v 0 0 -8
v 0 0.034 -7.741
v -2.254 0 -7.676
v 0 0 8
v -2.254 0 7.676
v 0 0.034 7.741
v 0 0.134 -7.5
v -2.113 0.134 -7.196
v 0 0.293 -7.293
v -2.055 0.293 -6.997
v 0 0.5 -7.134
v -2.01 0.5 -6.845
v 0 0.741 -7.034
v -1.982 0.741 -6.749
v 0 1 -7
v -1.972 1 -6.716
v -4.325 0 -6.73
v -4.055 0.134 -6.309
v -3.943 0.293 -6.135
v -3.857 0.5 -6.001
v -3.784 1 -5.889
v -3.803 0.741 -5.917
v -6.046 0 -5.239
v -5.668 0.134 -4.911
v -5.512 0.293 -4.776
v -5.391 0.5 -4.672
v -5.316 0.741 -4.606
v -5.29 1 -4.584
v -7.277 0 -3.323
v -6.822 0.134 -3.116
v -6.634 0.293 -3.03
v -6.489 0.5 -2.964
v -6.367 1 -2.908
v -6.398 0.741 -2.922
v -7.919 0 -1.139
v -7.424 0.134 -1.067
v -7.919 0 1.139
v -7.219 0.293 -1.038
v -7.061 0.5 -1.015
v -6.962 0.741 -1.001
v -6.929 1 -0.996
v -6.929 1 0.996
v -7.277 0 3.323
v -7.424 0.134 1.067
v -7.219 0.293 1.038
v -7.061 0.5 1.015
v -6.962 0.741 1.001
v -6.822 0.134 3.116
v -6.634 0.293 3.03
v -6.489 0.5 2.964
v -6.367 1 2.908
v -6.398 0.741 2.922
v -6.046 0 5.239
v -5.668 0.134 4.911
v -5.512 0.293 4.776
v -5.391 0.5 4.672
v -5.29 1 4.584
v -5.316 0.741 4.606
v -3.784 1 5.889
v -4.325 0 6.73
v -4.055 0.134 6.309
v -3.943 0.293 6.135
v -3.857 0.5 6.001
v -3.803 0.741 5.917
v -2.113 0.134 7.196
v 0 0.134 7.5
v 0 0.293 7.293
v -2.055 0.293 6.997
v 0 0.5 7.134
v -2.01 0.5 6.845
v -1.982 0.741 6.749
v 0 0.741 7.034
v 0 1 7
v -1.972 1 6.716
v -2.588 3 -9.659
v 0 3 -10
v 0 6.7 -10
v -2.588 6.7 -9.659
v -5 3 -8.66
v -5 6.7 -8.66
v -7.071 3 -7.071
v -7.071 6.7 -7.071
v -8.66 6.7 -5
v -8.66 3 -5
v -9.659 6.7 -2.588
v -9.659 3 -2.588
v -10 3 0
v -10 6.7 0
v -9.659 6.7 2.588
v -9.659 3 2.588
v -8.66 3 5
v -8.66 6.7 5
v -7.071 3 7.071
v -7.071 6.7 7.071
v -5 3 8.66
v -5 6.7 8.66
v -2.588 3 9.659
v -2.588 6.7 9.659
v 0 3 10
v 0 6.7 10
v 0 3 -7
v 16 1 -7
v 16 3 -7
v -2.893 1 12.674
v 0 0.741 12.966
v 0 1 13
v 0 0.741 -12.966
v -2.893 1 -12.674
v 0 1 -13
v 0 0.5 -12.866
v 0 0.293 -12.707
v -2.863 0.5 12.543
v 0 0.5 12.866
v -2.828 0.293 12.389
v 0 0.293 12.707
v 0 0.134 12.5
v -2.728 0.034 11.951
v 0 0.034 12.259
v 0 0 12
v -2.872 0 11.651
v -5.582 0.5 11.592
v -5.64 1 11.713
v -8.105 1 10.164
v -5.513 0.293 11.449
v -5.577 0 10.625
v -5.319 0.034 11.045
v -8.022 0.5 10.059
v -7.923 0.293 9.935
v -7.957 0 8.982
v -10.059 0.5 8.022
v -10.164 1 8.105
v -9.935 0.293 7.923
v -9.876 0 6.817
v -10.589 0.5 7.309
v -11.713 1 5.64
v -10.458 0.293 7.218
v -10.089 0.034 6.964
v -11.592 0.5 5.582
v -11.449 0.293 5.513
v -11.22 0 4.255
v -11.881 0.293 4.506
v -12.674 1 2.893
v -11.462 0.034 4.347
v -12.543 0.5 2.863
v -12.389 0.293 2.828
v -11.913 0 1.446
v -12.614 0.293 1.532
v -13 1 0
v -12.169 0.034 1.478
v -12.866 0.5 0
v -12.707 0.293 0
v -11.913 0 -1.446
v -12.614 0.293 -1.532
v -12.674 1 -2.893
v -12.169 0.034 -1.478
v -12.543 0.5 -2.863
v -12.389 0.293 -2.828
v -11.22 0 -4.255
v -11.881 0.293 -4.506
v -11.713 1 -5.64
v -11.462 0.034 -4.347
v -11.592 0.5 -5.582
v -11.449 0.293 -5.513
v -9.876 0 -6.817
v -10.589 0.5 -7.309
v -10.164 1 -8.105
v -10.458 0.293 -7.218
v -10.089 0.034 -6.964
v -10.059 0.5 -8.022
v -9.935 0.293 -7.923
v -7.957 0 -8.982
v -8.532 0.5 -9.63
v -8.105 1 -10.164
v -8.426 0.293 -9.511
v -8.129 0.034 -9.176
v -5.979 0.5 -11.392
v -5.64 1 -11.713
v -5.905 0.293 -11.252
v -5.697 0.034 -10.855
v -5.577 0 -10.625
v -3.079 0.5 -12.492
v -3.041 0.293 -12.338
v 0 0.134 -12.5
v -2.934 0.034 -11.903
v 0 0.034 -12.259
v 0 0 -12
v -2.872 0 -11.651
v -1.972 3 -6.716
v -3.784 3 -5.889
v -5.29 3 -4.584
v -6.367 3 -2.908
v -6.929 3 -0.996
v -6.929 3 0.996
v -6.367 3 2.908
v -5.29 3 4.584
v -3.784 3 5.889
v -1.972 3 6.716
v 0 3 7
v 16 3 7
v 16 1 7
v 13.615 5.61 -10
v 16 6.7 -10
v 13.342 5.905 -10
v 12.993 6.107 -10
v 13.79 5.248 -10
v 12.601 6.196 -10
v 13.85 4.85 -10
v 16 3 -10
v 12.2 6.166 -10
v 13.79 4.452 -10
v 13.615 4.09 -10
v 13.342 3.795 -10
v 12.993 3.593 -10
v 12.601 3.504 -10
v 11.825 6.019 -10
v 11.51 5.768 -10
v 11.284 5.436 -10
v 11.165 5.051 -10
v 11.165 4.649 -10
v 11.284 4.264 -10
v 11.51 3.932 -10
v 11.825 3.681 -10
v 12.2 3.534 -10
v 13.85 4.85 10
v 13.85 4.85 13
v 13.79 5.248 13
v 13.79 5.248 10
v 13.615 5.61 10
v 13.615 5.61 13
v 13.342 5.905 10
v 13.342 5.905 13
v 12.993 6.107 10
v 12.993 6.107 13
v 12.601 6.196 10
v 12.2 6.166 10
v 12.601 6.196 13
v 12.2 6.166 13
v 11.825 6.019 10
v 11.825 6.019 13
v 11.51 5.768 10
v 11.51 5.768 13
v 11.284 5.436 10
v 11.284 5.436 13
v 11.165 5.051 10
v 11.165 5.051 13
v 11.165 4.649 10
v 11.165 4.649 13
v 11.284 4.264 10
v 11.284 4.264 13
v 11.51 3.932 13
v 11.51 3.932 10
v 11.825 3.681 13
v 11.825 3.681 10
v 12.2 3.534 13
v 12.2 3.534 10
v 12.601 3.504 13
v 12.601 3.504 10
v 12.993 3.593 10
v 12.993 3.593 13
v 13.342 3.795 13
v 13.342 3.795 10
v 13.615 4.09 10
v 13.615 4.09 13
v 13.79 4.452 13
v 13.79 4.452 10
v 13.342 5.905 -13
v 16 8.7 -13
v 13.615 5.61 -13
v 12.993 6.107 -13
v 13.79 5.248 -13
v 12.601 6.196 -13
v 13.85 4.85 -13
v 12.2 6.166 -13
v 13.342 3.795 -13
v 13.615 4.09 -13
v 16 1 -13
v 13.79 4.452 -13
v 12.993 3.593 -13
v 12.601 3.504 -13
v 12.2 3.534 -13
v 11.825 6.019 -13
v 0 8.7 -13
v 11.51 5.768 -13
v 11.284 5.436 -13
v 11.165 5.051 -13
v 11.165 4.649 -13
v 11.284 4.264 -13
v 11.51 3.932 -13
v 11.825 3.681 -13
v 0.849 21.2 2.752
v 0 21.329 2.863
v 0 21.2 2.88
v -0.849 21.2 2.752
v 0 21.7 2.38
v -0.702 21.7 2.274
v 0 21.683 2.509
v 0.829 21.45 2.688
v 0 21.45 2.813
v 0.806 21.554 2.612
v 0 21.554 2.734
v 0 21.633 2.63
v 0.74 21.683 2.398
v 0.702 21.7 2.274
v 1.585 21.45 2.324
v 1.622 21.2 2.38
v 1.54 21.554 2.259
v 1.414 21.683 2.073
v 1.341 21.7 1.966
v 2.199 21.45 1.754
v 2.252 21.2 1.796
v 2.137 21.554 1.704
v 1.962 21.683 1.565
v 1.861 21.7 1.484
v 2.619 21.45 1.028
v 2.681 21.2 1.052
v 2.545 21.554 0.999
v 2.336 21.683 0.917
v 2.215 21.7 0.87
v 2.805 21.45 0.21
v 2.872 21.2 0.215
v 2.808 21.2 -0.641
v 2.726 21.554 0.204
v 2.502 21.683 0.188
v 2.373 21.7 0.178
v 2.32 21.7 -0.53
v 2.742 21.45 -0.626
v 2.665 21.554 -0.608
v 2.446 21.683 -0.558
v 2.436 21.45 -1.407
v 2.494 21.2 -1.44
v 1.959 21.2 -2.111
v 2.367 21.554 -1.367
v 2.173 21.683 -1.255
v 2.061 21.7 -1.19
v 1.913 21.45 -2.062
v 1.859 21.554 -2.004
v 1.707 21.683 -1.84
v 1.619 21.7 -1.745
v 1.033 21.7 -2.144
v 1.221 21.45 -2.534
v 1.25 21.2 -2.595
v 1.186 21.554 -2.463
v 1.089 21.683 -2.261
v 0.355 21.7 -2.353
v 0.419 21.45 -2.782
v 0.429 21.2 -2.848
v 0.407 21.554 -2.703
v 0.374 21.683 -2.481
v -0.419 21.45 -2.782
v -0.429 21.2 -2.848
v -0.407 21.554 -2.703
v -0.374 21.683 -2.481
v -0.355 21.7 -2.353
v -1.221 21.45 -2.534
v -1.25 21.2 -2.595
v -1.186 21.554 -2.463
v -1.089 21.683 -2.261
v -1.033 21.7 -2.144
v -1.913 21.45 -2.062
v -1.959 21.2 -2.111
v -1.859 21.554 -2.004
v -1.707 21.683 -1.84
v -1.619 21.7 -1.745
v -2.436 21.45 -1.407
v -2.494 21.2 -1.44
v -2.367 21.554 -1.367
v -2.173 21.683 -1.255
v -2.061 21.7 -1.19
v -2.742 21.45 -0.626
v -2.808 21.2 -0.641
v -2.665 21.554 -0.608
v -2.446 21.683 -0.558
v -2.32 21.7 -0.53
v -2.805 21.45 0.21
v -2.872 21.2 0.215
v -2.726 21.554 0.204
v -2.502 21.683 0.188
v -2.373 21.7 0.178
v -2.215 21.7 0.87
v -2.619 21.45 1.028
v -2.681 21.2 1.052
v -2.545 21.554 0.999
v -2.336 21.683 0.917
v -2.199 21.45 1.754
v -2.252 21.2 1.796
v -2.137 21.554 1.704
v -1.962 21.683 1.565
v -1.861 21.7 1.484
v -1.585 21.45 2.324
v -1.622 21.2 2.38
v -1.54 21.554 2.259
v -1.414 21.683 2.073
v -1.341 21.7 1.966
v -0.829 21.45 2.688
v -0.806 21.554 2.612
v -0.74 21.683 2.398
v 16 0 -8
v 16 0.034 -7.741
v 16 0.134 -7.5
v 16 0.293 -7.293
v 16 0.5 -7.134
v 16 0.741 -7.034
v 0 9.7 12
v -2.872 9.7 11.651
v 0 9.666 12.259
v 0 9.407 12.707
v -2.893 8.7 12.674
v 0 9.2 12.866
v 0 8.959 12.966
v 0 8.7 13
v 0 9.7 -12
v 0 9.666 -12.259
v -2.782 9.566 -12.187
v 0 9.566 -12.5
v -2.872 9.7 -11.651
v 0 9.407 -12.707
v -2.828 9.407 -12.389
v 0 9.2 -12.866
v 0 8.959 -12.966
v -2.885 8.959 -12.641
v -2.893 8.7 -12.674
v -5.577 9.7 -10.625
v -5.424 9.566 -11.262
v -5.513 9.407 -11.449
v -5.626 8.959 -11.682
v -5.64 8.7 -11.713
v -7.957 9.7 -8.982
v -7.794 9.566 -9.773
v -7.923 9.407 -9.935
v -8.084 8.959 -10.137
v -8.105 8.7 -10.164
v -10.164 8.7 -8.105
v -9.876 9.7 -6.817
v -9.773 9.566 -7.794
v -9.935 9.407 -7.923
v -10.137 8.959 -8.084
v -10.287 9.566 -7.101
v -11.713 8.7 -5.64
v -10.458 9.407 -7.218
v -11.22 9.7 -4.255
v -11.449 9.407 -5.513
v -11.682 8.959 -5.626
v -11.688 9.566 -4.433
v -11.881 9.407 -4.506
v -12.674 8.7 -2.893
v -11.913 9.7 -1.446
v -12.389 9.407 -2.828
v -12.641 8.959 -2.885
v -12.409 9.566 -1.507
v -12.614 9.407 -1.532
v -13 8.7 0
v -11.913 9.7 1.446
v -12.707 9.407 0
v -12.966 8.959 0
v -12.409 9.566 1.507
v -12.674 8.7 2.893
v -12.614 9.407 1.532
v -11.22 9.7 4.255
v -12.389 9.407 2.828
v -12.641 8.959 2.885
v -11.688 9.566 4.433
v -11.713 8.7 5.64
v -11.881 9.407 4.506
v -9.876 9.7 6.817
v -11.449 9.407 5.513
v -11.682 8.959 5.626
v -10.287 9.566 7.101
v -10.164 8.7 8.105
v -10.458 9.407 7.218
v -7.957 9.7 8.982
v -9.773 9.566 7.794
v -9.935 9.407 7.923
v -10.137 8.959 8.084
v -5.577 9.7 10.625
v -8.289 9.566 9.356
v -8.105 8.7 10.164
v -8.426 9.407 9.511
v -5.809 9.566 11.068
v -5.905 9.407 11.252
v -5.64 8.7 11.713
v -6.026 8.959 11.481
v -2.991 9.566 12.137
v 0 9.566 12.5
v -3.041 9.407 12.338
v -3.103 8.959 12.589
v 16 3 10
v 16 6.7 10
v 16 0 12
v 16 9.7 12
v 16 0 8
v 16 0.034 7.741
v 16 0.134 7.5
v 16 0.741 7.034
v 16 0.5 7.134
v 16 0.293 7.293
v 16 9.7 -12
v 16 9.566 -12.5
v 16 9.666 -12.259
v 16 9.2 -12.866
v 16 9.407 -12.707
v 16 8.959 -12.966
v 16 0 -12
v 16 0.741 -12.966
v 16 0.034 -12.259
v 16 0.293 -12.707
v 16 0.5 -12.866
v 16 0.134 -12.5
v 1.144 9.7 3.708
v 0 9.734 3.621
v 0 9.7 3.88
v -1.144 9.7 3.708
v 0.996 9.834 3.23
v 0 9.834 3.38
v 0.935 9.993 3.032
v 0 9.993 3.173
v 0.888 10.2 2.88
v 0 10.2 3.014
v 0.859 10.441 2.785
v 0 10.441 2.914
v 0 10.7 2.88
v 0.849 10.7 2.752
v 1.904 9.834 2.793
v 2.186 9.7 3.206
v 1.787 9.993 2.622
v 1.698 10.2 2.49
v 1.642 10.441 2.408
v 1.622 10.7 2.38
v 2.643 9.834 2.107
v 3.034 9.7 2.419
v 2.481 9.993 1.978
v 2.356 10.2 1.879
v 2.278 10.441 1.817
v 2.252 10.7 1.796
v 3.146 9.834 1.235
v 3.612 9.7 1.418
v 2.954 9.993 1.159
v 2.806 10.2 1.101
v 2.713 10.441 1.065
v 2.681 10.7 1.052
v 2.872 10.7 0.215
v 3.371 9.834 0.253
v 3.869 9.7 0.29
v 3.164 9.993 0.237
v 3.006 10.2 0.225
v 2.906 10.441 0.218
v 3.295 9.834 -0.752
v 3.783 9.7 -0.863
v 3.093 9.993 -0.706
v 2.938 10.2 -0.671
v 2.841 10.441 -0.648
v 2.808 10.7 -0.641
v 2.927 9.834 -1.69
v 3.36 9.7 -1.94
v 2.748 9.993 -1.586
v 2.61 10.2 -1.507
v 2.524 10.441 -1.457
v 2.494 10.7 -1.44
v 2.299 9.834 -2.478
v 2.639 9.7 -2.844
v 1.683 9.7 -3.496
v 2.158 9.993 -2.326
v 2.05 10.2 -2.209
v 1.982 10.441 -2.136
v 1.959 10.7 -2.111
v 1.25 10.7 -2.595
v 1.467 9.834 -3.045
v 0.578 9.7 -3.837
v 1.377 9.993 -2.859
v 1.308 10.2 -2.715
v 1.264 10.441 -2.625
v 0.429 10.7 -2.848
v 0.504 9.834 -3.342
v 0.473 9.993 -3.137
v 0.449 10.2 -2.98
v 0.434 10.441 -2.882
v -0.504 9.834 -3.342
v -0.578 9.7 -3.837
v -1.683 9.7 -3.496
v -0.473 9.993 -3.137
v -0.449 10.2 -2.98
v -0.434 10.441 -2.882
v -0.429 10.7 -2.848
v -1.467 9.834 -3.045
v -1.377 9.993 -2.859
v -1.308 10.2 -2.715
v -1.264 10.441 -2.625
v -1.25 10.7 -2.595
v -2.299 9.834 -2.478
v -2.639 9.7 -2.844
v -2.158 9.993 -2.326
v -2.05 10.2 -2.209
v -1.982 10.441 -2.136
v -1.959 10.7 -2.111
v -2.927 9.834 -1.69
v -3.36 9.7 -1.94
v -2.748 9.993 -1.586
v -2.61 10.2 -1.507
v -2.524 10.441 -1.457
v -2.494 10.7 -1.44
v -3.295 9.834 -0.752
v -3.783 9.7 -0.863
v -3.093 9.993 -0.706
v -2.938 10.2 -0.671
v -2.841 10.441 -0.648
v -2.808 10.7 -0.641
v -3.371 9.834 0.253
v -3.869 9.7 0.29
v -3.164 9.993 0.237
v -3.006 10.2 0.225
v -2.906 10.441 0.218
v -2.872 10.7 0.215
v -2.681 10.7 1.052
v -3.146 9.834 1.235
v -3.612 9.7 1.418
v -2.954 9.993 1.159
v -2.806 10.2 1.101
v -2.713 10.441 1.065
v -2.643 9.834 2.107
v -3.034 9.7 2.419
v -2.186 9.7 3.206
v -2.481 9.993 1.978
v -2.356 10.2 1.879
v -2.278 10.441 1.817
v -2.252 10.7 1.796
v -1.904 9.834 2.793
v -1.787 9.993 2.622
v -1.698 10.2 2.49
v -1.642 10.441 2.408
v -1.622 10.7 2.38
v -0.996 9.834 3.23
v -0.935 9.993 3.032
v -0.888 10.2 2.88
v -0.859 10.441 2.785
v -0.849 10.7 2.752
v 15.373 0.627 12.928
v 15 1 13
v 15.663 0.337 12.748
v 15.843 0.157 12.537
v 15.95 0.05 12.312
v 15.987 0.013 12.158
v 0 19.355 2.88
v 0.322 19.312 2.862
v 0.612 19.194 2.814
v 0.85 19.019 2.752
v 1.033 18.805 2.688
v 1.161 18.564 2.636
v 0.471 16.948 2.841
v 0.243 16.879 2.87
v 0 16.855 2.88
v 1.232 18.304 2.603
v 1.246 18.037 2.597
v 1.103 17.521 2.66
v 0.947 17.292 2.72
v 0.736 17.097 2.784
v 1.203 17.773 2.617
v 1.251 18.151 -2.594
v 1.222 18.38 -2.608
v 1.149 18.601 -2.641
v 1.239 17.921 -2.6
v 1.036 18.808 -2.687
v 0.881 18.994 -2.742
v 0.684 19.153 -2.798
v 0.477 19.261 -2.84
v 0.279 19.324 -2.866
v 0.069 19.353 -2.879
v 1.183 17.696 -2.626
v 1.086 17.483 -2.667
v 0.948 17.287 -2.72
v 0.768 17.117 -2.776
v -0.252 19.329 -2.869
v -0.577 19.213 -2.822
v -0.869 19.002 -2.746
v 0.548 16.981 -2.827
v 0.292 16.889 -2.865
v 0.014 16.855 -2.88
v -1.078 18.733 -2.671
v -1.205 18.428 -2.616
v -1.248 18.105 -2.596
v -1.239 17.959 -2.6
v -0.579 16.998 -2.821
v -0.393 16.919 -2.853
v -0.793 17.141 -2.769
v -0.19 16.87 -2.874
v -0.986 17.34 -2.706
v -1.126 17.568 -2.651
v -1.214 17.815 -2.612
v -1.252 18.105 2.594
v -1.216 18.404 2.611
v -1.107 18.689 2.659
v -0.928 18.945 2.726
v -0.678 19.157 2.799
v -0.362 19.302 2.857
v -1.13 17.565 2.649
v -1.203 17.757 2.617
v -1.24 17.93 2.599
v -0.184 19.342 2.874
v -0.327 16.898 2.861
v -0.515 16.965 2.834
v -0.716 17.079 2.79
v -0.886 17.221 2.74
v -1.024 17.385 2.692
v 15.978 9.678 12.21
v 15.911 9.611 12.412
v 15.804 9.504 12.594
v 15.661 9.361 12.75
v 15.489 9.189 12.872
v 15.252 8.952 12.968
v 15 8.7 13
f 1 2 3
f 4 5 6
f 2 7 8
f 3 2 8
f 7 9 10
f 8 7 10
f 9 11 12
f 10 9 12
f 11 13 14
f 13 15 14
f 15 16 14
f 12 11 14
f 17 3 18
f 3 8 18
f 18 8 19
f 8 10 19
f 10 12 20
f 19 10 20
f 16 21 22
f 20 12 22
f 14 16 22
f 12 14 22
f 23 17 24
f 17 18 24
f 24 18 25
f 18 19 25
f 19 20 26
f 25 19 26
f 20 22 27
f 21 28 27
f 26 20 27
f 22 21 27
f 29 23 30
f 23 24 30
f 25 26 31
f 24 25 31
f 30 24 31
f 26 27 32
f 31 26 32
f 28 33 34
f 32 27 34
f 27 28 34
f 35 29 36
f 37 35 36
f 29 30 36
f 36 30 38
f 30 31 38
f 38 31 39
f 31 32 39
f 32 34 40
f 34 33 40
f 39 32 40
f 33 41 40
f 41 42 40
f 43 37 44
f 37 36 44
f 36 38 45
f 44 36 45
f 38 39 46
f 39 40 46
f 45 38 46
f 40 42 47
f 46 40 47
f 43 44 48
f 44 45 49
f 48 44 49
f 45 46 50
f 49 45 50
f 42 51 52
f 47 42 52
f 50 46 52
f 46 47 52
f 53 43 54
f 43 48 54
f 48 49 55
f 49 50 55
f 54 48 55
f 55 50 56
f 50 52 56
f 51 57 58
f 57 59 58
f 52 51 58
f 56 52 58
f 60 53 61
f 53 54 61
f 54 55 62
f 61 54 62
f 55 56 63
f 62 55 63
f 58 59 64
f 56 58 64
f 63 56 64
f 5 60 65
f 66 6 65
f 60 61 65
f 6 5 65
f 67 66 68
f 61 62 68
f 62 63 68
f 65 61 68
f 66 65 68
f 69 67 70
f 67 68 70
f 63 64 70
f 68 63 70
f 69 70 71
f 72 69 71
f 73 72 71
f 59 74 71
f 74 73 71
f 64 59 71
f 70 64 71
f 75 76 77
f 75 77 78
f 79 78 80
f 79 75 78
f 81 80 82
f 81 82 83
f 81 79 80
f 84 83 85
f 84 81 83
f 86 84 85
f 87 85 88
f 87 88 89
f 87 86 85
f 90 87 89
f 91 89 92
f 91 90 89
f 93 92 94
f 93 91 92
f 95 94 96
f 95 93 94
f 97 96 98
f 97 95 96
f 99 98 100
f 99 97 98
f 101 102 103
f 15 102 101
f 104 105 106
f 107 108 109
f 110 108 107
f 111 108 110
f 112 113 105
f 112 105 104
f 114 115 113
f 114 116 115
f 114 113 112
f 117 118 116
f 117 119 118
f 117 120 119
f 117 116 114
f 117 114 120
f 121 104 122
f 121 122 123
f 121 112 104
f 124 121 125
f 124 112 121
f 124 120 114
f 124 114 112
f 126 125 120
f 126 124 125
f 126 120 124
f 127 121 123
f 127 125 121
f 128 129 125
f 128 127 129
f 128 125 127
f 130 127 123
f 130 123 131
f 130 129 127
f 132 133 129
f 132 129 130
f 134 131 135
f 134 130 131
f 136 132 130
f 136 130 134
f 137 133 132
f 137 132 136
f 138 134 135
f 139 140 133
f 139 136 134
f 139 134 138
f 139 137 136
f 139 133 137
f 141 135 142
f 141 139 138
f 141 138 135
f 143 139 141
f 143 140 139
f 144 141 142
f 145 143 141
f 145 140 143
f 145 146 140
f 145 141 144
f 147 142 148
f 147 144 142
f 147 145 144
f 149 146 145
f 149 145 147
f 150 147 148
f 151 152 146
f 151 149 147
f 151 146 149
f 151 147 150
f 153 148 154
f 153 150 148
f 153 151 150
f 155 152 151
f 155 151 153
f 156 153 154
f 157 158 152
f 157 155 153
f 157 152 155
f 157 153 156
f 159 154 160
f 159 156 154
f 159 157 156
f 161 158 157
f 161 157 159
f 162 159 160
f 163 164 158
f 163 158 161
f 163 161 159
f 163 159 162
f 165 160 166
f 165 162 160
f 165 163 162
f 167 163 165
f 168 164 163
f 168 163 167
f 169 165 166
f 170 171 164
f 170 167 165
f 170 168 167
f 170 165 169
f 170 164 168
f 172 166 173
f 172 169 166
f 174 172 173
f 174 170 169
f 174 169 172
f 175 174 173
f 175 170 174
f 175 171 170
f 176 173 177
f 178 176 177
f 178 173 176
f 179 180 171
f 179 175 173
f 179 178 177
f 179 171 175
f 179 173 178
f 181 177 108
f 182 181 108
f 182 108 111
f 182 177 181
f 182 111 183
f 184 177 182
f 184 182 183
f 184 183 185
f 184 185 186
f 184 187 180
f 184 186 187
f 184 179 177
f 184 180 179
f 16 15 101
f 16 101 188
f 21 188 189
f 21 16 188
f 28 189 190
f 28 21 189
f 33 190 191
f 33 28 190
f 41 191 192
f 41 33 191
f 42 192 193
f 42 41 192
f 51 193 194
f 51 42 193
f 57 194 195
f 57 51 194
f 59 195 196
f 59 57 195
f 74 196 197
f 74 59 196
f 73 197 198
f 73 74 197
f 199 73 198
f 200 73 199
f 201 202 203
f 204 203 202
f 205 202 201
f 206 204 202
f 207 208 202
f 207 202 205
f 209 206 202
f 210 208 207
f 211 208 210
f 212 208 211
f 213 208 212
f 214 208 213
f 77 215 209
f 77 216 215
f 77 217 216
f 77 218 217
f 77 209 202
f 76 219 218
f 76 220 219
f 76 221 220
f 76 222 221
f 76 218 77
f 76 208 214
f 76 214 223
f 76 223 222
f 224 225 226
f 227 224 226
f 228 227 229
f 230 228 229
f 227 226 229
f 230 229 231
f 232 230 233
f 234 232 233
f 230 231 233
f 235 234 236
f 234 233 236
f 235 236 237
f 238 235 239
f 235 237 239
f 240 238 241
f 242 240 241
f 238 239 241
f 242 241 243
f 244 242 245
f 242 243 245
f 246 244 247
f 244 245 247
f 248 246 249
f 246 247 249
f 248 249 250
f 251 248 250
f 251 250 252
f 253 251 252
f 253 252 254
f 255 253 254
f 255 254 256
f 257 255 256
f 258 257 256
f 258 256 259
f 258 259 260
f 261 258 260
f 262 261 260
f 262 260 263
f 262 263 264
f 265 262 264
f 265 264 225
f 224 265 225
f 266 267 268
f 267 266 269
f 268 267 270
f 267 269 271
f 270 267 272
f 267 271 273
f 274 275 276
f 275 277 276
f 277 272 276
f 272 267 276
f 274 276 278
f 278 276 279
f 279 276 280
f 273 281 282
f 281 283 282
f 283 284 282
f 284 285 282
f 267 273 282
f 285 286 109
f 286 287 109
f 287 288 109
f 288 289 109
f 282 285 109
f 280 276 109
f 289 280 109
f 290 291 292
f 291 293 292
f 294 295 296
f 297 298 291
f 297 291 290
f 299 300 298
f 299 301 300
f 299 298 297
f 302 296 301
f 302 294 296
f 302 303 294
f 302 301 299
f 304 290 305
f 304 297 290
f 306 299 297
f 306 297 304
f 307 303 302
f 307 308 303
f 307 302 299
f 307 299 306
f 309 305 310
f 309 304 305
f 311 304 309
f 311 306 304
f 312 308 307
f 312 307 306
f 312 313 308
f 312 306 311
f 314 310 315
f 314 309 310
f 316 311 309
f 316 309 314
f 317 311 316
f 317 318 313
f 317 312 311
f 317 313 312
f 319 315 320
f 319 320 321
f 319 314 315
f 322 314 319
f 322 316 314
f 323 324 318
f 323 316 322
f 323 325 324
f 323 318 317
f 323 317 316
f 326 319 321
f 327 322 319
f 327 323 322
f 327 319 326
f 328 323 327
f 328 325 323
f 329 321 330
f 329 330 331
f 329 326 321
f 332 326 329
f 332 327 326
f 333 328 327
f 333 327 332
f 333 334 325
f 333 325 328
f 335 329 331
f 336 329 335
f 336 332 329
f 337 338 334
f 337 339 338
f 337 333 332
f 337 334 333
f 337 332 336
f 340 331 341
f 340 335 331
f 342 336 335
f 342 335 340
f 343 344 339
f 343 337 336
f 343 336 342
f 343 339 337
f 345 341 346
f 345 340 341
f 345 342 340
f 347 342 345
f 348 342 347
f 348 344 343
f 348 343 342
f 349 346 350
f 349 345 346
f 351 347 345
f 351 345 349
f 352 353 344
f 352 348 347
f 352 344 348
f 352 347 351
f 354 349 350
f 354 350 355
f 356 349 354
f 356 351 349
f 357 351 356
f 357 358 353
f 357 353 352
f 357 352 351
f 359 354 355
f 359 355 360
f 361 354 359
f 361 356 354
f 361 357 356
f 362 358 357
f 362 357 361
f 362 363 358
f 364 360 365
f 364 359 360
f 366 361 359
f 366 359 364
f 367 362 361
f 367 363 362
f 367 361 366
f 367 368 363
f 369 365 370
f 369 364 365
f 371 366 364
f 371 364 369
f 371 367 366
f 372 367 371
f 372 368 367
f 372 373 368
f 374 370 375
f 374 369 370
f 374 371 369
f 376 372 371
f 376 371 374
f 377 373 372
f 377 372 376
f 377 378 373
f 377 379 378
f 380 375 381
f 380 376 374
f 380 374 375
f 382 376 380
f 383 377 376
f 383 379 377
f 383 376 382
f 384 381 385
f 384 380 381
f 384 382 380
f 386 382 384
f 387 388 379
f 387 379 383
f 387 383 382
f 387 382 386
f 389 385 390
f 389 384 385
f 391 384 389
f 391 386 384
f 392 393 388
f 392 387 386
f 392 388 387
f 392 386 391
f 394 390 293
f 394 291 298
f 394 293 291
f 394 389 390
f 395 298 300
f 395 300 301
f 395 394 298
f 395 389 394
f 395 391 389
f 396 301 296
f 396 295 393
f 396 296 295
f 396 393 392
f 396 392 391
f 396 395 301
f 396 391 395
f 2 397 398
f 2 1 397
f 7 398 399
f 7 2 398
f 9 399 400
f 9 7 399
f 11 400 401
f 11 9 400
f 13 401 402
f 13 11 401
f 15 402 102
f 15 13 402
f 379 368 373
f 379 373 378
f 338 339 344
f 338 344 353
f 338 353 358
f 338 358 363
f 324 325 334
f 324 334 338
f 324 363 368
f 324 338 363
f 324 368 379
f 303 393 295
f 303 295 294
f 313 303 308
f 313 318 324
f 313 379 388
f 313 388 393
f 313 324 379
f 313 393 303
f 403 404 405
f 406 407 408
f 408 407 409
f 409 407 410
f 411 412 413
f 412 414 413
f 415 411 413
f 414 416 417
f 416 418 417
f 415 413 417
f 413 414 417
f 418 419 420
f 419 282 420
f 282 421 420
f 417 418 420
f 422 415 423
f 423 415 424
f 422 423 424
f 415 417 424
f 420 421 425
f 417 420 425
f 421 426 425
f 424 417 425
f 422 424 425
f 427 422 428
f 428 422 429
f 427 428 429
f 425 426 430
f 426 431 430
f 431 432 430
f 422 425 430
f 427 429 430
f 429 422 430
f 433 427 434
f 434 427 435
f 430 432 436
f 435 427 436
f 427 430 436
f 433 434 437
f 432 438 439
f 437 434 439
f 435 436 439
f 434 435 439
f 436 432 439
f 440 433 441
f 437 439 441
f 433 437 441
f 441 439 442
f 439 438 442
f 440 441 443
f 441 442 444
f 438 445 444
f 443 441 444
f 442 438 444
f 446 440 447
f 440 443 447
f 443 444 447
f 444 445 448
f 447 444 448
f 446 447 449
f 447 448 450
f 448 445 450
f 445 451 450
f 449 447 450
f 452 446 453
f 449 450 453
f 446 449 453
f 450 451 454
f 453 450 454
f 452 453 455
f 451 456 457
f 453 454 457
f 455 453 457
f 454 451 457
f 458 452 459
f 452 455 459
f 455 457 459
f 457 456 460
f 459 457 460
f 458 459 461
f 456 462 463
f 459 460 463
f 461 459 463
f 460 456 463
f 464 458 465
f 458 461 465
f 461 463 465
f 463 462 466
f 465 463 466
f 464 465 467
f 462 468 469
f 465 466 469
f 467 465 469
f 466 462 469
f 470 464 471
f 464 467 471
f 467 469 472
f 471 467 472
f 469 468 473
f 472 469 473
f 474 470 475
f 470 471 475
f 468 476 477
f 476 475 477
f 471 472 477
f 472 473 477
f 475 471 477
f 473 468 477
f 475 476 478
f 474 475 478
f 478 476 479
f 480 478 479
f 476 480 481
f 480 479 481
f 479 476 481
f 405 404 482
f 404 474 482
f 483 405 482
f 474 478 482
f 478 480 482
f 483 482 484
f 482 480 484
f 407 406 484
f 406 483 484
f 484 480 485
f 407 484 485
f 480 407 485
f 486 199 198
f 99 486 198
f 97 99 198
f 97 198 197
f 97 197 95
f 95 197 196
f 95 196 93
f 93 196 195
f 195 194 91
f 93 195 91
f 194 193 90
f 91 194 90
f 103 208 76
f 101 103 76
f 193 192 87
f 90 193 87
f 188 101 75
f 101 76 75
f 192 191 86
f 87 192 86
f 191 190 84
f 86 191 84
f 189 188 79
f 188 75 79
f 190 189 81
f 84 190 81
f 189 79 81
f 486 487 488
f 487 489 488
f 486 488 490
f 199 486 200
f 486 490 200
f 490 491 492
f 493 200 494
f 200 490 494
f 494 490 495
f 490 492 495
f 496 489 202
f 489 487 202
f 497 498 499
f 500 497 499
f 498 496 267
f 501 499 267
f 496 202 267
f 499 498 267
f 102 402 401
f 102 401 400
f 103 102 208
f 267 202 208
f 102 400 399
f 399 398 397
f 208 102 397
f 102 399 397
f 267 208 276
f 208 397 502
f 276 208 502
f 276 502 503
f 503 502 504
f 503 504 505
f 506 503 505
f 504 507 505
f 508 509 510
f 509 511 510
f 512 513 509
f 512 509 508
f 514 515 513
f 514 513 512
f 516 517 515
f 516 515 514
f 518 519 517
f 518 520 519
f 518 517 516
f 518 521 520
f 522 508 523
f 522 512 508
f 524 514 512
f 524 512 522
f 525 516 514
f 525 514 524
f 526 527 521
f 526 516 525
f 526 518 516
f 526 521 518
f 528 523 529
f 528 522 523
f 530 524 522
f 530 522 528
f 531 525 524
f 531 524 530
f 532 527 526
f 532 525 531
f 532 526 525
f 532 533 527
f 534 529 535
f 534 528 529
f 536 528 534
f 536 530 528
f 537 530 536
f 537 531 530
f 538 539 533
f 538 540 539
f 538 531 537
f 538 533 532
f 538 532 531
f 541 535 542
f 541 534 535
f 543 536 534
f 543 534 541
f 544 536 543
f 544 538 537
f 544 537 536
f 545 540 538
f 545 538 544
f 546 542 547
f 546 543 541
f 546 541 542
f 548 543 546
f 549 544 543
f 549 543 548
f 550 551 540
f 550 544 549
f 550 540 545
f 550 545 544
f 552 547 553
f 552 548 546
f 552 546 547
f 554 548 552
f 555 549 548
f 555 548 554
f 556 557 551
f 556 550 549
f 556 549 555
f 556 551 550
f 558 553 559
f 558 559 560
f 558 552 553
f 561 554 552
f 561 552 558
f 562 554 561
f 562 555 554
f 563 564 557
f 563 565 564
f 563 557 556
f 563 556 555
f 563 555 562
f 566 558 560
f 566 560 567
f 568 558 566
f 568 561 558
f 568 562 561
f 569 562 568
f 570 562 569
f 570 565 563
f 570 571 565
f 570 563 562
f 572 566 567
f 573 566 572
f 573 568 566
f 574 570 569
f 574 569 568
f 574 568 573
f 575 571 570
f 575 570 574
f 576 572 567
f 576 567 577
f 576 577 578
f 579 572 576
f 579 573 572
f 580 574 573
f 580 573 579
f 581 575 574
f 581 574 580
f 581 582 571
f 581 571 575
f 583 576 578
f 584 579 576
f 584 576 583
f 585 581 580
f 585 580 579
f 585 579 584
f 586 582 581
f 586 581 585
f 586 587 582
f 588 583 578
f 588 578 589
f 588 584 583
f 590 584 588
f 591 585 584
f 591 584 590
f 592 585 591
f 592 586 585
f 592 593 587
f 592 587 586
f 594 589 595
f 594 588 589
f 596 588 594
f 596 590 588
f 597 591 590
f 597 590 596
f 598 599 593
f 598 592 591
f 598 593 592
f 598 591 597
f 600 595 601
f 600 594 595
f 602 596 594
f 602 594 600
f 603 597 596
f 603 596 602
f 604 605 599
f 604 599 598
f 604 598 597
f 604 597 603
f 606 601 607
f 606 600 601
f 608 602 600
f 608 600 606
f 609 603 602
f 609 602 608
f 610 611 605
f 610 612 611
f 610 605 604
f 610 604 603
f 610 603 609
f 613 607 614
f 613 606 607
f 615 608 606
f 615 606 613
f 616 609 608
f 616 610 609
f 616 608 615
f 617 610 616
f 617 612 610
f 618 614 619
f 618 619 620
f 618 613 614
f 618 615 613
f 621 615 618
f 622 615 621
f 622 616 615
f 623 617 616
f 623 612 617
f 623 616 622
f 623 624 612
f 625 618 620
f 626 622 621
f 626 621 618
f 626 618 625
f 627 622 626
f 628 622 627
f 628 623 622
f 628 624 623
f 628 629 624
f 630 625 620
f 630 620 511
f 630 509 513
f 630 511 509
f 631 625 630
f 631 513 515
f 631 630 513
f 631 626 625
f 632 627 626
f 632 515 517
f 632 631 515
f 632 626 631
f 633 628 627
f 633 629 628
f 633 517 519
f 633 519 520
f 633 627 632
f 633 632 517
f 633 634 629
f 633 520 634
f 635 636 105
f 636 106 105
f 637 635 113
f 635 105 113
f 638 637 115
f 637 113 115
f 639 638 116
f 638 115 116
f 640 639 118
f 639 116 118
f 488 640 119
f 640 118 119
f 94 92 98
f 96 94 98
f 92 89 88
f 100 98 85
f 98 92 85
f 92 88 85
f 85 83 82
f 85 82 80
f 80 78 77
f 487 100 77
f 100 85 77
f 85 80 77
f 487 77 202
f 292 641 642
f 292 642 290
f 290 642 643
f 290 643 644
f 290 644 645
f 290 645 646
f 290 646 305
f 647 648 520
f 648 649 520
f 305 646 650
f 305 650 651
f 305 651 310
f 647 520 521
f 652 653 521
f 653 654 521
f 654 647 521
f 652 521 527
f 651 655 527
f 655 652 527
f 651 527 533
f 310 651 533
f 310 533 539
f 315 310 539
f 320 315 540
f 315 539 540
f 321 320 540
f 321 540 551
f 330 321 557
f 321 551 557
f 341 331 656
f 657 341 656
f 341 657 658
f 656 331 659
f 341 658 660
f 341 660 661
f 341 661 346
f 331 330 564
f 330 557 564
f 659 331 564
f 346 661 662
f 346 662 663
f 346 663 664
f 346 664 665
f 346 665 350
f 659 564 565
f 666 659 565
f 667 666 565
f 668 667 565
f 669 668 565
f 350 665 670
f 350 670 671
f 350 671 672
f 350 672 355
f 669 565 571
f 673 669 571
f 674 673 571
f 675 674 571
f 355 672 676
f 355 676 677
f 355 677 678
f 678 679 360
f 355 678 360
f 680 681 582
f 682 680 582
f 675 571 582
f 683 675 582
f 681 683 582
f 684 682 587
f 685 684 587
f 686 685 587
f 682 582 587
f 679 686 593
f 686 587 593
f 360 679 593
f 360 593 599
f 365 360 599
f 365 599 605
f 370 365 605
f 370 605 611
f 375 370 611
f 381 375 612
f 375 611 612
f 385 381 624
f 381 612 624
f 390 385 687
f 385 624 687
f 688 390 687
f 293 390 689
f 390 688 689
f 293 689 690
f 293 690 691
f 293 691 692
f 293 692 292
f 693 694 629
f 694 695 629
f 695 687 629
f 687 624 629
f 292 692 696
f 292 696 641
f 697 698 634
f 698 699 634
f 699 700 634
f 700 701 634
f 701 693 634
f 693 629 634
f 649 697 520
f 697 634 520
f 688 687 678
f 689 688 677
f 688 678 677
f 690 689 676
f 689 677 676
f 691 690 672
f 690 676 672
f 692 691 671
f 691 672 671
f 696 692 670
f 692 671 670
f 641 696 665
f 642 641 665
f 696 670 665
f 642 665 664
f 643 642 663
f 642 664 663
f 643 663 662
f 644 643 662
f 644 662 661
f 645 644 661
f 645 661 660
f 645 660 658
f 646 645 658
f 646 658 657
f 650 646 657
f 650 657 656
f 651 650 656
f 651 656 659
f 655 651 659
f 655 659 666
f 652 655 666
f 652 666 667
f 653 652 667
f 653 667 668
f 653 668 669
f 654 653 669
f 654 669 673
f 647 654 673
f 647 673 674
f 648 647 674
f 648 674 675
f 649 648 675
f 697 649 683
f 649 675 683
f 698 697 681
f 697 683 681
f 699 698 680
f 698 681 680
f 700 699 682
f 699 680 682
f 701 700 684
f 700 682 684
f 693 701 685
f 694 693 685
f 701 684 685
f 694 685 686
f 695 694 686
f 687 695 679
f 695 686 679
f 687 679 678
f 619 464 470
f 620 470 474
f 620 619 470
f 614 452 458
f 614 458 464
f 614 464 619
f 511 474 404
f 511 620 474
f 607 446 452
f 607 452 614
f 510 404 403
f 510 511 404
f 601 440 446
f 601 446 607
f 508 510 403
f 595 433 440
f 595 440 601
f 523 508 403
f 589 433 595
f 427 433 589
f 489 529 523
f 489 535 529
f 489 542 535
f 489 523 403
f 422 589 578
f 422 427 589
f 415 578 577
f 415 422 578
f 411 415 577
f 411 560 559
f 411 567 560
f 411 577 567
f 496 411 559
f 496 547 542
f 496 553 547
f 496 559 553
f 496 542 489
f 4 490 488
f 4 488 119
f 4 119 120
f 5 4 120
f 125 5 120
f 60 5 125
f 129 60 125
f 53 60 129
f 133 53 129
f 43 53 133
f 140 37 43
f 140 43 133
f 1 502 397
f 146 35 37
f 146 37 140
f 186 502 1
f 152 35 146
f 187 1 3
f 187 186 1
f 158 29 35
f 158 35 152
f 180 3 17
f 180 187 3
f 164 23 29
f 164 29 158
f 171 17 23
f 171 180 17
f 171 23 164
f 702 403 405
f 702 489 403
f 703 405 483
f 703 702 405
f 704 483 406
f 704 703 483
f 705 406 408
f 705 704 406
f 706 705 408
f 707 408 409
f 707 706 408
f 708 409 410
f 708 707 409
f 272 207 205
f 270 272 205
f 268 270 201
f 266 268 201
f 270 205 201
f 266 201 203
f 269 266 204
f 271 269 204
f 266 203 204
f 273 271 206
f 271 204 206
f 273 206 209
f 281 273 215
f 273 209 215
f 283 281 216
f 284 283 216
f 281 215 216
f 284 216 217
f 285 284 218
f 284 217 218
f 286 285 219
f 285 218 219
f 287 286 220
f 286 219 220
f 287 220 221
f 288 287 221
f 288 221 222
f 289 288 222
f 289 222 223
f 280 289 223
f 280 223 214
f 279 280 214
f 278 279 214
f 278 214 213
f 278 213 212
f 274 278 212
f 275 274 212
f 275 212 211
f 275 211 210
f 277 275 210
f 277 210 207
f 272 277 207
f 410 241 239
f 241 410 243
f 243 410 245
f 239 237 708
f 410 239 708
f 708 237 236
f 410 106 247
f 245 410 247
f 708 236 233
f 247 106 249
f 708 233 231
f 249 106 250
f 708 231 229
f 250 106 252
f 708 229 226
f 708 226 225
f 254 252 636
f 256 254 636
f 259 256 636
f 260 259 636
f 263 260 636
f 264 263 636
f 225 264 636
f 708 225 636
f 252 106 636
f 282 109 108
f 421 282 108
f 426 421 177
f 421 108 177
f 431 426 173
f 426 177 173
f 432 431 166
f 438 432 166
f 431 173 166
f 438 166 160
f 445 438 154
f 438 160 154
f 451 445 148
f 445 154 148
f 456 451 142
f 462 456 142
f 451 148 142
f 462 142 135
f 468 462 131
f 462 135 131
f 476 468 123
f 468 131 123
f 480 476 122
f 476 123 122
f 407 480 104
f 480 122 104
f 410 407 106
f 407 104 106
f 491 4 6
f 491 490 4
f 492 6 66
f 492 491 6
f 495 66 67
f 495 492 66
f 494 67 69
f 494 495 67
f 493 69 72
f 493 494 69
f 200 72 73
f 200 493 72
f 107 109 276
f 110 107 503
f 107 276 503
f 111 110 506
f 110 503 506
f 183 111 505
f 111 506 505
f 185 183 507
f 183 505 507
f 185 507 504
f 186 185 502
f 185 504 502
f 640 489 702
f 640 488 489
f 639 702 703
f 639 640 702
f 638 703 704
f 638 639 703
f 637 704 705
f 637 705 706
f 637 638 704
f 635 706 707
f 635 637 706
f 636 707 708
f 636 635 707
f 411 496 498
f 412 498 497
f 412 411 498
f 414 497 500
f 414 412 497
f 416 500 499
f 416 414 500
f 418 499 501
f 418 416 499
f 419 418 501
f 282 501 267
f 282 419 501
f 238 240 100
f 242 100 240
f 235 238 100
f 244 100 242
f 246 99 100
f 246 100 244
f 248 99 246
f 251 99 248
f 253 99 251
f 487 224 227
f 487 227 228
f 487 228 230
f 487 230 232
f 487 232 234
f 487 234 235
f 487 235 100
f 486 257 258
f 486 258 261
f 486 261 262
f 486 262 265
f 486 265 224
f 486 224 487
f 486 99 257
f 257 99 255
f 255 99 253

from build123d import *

# Parameters (mm, degrees)
BOSS_EXTRUDE1_DEPTH   = 3
BOSS_EXTRUDE2_DEPTH   = 3.7
BOSS_EXTRUDE3_DEPTH   = 3
SKETCH4_R             = 2.88
BOSS_EXTRUDE4_DEPTH   = 12
F_2_5MM_DOWEL_HOLE1_D = 2.5
SKETCH8_R             = 1.35
CUT_EXTRUDE1_DEPTH    = 38.455173265
FILLET1_R             = 1
FILLET2_R             = 1
FILLET3_R             = 0.5


with BuildPart() as part:
    # Sketch1 → Boss-Extrude1 (new body)
    with BuildSketch(Plane(origin=(0, 0, 0), x_dir=(1, 0, 0), z_dir=(0, 1, 0))):
        with BuildLine():
            Line((0, 13), (16, 13))
            Line((16, 13), (16, 7))
            Line((16, 7), (0, 7))
            ThreePointArc((0, 7), (-7, 0), (0, -7))
            Line((0, -7), (16, -7))
            Line((16, -7), (16, -13))
            Line((16, -13), (0, -13))
            ThreePointArc((0, -13), (-13, 0), (0, 13))
        make_face()
    extrude(amount=BOSS_EXTRUDE1_DEPTH)

    # Sketch2 → Boss-Extrude2 (add)
    with BuildSketch(Plane(origin=(0, 3, 0), x_dir=(1, 0, 0), z_dir=(0, 1, 0))):
        with BuildLine():
            Line((0, 13), (16, 13))
            Line((16, 13), (16, 10))
            Line((16, 10), (0, 10))
            ThreePointArc((0, 10), (-10, 0), (0, -10))
            Line((0, -10), (16, -10))
            Line((16, -10), (16, -13))
            Line((16, -13), (0, -13))
            ThreePointArc((0, -13), (-13, 0), (0, 13))
        make_face()
    extrude(amount=BOSS_EXTRUDE2_DEPTH)

    # Sketch3 → Boss-Extrude3 (add)
    with BuildSketch(Plane(origin=(0, 6.7, 0), x_dir=(1, 0, 0), z_dir=(0, 1, 0))):
        with BuildLine():
            Line((16, 13), (0, 13))
            ThreePointArc((0, 13), (-13, 0), (0, -13))
            Line((0, -13), (16, -13))
            Line((16, -13), (16, -7))
            Line((16, -7), (16, 7))
            Line((16, 7), (16, 13))
        make_face()
    extrude(amount=BOSS_EXTRUDE3_DEPTH)

    # Sketch4 → Boss-Extrude4 (add)
    with BuildSketch(Plane(origin=(0, 9.7, 0), x_dir=(1, 0, 0), z_dir=(0, 1, 0))):
        with Locations(Location((0, 0, 0), (0, 0, 270))):
            Circle(SKETCH4_R)
    extrude(amount=BOSS_EXTRUDE4_DEPTH)

    # Ø2.5mm Dowel Hole1 (through all)
    with Locations(Plane(origin=(-0.002429038, 18.104937254, 2.879998976), x_dir=(0.999999644325, 0, 0.000843415861), z_dir=(-0.000843415861, 0, 0.999999644325))):
        with Locations((0, 0)):
            Hole(F_2_5MM_DOWEL_HOLE1_D / 2)

    # Sketch8 → Cut-Extrude1 (cut, through all)
    with BuildSketch(Plane.XY.offset(13)):
        with Locations((12.5, 4.85)):
            Circle(SKETCH8_R)
    extrude(amount=-CUT_EXTRUDE1_DEPTH, mode=Mode.SUBTRACT)

    # Fillet1
    fillet1_edges = [part.edges().sort_by_distance(p)[0] for p in [
        (8, 0, -13),
        (8, 0, -7),
        (-7, 0, 0),
        (16, 4.85, 13),
        (-13, 9.7, 0),
        (8, 9.7, 13),
        (8, 9.7, -13),
        (8, 0, 7),
        (8, 0, 13),
        (-13, 0, 0),
    ]]
    fillet(fillet1_edges, radius=FILLET1_R)

    # Fillet2
    fillet2_edges = [part.edges().sort_by_distance(p)[0] for p in [
        (0, 9.7, -2.88),
    ]]
    fillet(fillet2_edges, radius=FILLET2_R)

    # Fillet3
    fillet3_edges = [part.edges().sort_by_distance(p)[0] for p in [
        (0, 21.7, -2.88),
    ]]
    fillet(fillet3_edges, radius=FILLET3_R)


solid = part.part
